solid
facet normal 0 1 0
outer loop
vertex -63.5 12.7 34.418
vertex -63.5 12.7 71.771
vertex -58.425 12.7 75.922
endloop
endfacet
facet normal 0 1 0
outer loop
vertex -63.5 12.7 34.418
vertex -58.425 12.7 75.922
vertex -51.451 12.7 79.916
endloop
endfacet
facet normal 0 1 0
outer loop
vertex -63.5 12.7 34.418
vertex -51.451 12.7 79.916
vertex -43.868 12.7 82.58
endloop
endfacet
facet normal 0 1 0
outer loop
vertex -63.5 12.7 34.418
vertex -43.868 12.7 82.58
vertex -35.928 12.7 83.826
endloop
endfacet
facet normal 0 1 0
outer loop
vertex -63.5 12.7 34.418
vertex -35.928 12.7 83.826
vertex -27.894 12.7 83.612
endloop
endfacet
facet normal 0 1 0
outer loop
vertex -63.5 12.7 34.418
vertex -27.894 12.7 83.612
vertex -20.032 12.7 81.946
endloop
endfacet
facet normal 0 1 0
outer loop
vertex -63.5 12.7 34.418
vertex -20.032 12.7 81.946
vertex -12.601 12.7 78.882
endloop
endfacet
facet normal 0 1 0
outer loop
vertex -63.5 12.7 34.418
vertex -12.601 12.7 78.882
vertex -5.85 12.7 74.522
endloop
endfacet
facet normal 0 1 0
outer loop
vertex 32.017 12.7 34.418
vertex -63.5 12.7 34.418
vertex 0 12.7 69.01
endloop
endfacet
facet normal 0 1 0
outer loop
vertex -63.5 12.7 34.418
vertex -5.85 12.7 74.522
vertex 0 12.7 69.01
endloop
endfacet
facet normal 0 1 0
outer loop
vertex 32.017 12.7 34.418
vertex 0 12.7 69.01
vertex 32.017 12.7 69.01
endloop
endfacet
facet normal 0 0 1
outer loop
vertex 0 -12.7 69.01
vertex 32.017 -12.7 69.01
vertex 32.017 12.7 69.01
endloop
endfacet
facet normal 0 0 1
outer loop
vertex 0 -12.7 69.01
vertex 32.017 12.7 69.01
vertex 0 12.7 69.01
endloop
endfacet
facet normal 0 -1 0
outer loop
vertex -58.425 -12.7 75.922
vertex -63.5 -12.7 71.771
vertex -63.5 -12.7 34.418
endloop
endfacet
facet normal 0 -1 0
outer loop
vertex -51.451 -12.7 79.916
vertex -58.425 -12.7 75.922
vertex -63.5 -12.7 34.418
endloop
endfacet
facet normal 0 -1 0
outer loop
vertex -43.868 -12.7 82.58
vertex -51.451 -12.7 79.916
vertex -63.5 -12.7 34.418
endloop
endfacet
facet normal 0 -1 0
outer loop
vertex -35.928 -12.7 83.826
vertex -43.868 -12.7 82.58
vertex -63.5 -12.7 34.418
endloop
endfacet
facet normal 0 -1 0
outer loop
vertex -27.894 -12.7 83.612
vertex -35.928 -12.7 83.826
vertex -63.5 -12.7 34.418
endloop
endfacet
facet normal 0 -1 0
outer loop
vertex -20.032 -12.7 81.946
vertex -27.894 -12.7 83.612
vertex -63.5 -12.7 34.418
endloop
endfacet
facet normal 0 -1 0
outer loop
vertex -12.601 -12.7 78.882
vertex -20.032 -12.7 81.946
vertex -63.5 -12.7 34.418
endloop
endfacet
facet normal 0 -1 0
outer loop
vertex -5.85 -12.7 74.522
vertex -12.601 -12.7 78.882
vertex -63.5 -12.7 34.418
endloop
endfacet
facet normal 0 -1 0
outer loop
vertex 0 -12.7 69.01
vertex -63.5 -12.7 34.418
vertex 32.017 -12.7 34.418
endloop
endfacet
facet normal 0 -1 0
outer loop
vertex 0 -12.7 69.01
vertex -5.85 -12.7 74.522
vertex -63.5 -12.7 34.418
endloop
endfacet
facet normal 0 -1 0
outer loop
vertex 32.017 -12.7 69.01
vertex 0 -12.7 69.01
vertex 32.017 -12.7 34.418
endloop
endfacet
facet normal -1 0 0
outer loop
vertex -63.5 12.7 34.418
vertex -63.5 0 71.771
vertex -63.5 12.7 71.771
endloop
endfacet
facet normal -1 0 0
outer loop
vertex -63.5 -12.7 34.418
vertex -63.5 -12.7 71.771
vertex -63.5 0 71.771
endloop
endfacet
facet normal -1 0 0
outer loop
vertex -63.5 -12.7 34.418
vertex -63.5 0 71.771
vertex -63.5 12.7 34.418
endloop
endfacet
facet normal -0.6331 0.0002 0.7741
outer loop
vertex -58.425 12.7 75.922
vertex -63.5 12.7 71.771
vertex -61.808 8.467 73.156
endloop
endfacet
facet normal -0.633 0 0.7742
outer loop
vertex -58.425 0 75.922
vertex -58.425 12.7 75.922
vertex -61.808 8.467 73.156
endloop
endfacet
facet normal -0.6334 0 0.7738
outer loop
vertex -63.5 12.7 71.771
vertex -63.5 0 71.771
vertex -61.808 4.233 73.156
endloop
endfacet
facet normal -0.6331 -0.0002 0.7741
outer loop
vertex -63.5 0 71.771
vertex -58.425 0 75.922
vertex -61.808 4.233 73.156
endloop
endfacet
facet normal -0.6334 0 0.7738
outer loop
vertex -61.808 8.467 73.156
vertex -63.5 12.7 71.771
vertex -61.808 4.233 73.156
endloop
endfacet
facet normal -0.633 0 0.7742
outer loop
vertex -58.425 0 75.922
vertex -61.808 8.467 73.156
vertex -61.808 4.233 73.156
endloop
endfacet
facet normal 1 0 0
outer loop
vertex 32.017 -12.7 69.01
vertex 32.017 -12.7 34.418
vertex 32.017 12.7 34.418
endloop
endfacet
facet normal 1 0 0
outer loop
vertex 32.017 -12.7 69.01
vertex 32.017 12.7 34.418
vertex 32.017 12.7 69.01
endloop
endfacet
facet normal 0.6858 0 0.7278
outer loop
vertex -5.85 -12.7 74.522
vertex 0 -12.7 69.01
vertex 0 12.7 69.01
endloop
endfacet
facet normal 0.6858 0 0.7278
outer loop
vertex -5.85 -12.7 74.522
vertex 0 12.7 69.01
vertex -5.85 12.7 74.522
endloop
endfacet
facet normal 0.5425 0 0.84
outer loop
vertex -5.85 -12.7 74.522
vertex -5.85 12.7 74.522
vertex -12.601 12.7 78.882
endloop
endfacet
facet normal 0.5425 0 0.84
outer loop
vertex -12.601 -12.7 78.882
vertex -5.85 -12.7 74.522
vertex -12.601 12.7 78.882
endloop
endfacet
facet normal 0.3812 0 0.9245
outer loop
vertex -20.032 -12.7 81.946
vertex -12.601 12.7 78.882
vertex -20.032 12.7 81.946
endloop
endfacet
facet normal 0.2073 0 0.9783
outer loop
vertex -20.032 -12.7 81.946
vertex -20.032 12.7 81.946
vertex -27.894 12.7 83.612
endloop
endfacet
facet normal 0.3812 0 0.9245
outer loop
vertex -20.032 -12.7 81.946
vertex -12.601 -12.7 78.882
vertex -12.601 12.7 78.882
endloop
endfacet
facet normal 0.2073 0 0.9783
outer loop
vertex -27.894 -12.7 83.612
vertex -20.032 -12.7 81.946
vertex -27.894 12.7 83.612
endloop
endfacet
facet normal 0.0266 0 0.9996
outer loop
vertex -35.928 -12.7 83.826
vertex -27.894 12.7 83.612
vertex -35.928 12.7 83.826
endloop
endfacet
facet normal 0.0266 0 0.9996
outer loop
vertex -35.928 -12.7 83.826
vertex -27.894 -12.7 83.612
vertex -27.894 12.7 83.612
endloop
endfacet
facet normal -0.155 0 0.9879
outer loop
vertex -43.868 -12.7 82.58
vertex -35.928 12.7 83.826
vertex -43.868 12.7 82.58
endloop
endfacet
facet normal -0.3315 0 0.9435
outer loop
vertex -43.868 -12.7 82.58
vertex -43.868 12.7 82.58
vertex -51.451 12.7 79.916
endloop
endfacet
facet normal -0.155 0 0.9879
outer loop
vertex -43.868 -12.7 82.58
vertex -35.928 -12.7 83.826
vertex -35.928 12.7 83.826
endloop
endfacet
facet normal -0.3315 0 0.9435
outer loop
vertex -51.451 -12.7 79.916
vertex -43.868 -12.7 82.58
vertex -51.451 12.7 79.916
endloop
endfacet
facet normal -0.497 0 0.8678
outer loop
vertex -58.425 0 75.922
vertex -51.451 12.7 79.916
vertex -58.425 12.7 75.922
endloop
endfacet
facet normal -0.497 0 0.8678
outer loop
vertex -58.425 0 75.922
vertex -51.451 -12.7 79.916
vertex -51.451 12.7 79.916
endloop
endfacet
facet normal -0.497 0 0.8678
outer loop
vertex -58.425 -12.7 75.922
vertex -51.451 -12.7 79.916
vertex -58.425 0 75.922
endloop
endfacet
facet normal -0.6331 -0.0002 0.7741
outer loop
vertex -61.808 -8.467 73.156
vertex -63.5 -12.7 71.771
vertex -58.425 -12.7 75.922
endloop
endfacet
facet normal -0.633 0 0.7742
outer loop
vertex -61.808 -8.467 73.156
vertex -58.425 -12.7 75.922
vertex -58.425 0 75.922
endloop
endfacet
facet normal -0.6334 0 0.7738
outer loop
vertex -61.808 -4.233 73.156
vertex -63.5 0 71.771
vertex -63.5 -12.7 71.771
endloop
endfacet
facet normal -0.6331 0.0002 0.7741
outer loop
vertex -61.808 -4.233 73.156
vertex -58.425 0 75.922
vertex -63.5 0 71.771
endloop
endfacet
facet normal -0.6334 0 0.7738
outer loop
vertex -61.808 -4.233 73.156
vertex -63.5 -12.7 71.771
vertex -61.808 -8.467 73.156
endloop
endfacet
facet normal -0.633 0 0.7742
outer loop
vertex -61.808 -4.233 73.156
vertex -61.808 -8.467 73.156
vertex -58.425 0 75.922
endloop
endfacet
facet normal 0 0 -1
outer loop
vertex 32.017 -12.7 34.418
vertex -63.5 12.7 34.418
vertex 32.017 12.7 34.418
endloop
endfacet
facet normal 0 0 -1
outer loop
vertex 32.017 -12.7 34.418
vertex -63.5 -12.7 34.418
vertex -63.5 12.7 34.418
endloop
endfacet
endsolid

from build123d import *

# Parameters (mm, degrees)
F1_DEPTH = 12.7


with BuildPart() as f1:
    # F0 (on Front) → F1 (new body, symmetric)
    with BuildSketch(Plane.XZ):
        with BuildLine():
            Line((-63.5, 34.4180623237), (32.016806888, 34.4180623237))
            Line((32.016806888, 34.4180623237), (32.016806888, 69.0101948619))
            Line((32.016806888, 69.0101948619), (0, 69.0101948619))
            ThreePointArc((0, 69.0101948619), (-27.8940208661, 83.6123583705), (-58.4252133702, 75.9217235792))
            add(Edge.make_bspline(
                [(-63.5, 71.771000415), (-61.8079017418, 73.1557863165), (-60.1158034836, 74.540572218), (-58.4252133702, 75.9217235792)],
                knots=[0, 0, 0, 0, 0.0235260639, 0.0235260639, 0.0235260639, 0.0235260639], degree=3))
            Line((-63.5, 71.771000415), (-63.5, 34.4180623237))
        make_face()
    extrude(amount=F1_DEPTH, both=True)


solid = f1.part
